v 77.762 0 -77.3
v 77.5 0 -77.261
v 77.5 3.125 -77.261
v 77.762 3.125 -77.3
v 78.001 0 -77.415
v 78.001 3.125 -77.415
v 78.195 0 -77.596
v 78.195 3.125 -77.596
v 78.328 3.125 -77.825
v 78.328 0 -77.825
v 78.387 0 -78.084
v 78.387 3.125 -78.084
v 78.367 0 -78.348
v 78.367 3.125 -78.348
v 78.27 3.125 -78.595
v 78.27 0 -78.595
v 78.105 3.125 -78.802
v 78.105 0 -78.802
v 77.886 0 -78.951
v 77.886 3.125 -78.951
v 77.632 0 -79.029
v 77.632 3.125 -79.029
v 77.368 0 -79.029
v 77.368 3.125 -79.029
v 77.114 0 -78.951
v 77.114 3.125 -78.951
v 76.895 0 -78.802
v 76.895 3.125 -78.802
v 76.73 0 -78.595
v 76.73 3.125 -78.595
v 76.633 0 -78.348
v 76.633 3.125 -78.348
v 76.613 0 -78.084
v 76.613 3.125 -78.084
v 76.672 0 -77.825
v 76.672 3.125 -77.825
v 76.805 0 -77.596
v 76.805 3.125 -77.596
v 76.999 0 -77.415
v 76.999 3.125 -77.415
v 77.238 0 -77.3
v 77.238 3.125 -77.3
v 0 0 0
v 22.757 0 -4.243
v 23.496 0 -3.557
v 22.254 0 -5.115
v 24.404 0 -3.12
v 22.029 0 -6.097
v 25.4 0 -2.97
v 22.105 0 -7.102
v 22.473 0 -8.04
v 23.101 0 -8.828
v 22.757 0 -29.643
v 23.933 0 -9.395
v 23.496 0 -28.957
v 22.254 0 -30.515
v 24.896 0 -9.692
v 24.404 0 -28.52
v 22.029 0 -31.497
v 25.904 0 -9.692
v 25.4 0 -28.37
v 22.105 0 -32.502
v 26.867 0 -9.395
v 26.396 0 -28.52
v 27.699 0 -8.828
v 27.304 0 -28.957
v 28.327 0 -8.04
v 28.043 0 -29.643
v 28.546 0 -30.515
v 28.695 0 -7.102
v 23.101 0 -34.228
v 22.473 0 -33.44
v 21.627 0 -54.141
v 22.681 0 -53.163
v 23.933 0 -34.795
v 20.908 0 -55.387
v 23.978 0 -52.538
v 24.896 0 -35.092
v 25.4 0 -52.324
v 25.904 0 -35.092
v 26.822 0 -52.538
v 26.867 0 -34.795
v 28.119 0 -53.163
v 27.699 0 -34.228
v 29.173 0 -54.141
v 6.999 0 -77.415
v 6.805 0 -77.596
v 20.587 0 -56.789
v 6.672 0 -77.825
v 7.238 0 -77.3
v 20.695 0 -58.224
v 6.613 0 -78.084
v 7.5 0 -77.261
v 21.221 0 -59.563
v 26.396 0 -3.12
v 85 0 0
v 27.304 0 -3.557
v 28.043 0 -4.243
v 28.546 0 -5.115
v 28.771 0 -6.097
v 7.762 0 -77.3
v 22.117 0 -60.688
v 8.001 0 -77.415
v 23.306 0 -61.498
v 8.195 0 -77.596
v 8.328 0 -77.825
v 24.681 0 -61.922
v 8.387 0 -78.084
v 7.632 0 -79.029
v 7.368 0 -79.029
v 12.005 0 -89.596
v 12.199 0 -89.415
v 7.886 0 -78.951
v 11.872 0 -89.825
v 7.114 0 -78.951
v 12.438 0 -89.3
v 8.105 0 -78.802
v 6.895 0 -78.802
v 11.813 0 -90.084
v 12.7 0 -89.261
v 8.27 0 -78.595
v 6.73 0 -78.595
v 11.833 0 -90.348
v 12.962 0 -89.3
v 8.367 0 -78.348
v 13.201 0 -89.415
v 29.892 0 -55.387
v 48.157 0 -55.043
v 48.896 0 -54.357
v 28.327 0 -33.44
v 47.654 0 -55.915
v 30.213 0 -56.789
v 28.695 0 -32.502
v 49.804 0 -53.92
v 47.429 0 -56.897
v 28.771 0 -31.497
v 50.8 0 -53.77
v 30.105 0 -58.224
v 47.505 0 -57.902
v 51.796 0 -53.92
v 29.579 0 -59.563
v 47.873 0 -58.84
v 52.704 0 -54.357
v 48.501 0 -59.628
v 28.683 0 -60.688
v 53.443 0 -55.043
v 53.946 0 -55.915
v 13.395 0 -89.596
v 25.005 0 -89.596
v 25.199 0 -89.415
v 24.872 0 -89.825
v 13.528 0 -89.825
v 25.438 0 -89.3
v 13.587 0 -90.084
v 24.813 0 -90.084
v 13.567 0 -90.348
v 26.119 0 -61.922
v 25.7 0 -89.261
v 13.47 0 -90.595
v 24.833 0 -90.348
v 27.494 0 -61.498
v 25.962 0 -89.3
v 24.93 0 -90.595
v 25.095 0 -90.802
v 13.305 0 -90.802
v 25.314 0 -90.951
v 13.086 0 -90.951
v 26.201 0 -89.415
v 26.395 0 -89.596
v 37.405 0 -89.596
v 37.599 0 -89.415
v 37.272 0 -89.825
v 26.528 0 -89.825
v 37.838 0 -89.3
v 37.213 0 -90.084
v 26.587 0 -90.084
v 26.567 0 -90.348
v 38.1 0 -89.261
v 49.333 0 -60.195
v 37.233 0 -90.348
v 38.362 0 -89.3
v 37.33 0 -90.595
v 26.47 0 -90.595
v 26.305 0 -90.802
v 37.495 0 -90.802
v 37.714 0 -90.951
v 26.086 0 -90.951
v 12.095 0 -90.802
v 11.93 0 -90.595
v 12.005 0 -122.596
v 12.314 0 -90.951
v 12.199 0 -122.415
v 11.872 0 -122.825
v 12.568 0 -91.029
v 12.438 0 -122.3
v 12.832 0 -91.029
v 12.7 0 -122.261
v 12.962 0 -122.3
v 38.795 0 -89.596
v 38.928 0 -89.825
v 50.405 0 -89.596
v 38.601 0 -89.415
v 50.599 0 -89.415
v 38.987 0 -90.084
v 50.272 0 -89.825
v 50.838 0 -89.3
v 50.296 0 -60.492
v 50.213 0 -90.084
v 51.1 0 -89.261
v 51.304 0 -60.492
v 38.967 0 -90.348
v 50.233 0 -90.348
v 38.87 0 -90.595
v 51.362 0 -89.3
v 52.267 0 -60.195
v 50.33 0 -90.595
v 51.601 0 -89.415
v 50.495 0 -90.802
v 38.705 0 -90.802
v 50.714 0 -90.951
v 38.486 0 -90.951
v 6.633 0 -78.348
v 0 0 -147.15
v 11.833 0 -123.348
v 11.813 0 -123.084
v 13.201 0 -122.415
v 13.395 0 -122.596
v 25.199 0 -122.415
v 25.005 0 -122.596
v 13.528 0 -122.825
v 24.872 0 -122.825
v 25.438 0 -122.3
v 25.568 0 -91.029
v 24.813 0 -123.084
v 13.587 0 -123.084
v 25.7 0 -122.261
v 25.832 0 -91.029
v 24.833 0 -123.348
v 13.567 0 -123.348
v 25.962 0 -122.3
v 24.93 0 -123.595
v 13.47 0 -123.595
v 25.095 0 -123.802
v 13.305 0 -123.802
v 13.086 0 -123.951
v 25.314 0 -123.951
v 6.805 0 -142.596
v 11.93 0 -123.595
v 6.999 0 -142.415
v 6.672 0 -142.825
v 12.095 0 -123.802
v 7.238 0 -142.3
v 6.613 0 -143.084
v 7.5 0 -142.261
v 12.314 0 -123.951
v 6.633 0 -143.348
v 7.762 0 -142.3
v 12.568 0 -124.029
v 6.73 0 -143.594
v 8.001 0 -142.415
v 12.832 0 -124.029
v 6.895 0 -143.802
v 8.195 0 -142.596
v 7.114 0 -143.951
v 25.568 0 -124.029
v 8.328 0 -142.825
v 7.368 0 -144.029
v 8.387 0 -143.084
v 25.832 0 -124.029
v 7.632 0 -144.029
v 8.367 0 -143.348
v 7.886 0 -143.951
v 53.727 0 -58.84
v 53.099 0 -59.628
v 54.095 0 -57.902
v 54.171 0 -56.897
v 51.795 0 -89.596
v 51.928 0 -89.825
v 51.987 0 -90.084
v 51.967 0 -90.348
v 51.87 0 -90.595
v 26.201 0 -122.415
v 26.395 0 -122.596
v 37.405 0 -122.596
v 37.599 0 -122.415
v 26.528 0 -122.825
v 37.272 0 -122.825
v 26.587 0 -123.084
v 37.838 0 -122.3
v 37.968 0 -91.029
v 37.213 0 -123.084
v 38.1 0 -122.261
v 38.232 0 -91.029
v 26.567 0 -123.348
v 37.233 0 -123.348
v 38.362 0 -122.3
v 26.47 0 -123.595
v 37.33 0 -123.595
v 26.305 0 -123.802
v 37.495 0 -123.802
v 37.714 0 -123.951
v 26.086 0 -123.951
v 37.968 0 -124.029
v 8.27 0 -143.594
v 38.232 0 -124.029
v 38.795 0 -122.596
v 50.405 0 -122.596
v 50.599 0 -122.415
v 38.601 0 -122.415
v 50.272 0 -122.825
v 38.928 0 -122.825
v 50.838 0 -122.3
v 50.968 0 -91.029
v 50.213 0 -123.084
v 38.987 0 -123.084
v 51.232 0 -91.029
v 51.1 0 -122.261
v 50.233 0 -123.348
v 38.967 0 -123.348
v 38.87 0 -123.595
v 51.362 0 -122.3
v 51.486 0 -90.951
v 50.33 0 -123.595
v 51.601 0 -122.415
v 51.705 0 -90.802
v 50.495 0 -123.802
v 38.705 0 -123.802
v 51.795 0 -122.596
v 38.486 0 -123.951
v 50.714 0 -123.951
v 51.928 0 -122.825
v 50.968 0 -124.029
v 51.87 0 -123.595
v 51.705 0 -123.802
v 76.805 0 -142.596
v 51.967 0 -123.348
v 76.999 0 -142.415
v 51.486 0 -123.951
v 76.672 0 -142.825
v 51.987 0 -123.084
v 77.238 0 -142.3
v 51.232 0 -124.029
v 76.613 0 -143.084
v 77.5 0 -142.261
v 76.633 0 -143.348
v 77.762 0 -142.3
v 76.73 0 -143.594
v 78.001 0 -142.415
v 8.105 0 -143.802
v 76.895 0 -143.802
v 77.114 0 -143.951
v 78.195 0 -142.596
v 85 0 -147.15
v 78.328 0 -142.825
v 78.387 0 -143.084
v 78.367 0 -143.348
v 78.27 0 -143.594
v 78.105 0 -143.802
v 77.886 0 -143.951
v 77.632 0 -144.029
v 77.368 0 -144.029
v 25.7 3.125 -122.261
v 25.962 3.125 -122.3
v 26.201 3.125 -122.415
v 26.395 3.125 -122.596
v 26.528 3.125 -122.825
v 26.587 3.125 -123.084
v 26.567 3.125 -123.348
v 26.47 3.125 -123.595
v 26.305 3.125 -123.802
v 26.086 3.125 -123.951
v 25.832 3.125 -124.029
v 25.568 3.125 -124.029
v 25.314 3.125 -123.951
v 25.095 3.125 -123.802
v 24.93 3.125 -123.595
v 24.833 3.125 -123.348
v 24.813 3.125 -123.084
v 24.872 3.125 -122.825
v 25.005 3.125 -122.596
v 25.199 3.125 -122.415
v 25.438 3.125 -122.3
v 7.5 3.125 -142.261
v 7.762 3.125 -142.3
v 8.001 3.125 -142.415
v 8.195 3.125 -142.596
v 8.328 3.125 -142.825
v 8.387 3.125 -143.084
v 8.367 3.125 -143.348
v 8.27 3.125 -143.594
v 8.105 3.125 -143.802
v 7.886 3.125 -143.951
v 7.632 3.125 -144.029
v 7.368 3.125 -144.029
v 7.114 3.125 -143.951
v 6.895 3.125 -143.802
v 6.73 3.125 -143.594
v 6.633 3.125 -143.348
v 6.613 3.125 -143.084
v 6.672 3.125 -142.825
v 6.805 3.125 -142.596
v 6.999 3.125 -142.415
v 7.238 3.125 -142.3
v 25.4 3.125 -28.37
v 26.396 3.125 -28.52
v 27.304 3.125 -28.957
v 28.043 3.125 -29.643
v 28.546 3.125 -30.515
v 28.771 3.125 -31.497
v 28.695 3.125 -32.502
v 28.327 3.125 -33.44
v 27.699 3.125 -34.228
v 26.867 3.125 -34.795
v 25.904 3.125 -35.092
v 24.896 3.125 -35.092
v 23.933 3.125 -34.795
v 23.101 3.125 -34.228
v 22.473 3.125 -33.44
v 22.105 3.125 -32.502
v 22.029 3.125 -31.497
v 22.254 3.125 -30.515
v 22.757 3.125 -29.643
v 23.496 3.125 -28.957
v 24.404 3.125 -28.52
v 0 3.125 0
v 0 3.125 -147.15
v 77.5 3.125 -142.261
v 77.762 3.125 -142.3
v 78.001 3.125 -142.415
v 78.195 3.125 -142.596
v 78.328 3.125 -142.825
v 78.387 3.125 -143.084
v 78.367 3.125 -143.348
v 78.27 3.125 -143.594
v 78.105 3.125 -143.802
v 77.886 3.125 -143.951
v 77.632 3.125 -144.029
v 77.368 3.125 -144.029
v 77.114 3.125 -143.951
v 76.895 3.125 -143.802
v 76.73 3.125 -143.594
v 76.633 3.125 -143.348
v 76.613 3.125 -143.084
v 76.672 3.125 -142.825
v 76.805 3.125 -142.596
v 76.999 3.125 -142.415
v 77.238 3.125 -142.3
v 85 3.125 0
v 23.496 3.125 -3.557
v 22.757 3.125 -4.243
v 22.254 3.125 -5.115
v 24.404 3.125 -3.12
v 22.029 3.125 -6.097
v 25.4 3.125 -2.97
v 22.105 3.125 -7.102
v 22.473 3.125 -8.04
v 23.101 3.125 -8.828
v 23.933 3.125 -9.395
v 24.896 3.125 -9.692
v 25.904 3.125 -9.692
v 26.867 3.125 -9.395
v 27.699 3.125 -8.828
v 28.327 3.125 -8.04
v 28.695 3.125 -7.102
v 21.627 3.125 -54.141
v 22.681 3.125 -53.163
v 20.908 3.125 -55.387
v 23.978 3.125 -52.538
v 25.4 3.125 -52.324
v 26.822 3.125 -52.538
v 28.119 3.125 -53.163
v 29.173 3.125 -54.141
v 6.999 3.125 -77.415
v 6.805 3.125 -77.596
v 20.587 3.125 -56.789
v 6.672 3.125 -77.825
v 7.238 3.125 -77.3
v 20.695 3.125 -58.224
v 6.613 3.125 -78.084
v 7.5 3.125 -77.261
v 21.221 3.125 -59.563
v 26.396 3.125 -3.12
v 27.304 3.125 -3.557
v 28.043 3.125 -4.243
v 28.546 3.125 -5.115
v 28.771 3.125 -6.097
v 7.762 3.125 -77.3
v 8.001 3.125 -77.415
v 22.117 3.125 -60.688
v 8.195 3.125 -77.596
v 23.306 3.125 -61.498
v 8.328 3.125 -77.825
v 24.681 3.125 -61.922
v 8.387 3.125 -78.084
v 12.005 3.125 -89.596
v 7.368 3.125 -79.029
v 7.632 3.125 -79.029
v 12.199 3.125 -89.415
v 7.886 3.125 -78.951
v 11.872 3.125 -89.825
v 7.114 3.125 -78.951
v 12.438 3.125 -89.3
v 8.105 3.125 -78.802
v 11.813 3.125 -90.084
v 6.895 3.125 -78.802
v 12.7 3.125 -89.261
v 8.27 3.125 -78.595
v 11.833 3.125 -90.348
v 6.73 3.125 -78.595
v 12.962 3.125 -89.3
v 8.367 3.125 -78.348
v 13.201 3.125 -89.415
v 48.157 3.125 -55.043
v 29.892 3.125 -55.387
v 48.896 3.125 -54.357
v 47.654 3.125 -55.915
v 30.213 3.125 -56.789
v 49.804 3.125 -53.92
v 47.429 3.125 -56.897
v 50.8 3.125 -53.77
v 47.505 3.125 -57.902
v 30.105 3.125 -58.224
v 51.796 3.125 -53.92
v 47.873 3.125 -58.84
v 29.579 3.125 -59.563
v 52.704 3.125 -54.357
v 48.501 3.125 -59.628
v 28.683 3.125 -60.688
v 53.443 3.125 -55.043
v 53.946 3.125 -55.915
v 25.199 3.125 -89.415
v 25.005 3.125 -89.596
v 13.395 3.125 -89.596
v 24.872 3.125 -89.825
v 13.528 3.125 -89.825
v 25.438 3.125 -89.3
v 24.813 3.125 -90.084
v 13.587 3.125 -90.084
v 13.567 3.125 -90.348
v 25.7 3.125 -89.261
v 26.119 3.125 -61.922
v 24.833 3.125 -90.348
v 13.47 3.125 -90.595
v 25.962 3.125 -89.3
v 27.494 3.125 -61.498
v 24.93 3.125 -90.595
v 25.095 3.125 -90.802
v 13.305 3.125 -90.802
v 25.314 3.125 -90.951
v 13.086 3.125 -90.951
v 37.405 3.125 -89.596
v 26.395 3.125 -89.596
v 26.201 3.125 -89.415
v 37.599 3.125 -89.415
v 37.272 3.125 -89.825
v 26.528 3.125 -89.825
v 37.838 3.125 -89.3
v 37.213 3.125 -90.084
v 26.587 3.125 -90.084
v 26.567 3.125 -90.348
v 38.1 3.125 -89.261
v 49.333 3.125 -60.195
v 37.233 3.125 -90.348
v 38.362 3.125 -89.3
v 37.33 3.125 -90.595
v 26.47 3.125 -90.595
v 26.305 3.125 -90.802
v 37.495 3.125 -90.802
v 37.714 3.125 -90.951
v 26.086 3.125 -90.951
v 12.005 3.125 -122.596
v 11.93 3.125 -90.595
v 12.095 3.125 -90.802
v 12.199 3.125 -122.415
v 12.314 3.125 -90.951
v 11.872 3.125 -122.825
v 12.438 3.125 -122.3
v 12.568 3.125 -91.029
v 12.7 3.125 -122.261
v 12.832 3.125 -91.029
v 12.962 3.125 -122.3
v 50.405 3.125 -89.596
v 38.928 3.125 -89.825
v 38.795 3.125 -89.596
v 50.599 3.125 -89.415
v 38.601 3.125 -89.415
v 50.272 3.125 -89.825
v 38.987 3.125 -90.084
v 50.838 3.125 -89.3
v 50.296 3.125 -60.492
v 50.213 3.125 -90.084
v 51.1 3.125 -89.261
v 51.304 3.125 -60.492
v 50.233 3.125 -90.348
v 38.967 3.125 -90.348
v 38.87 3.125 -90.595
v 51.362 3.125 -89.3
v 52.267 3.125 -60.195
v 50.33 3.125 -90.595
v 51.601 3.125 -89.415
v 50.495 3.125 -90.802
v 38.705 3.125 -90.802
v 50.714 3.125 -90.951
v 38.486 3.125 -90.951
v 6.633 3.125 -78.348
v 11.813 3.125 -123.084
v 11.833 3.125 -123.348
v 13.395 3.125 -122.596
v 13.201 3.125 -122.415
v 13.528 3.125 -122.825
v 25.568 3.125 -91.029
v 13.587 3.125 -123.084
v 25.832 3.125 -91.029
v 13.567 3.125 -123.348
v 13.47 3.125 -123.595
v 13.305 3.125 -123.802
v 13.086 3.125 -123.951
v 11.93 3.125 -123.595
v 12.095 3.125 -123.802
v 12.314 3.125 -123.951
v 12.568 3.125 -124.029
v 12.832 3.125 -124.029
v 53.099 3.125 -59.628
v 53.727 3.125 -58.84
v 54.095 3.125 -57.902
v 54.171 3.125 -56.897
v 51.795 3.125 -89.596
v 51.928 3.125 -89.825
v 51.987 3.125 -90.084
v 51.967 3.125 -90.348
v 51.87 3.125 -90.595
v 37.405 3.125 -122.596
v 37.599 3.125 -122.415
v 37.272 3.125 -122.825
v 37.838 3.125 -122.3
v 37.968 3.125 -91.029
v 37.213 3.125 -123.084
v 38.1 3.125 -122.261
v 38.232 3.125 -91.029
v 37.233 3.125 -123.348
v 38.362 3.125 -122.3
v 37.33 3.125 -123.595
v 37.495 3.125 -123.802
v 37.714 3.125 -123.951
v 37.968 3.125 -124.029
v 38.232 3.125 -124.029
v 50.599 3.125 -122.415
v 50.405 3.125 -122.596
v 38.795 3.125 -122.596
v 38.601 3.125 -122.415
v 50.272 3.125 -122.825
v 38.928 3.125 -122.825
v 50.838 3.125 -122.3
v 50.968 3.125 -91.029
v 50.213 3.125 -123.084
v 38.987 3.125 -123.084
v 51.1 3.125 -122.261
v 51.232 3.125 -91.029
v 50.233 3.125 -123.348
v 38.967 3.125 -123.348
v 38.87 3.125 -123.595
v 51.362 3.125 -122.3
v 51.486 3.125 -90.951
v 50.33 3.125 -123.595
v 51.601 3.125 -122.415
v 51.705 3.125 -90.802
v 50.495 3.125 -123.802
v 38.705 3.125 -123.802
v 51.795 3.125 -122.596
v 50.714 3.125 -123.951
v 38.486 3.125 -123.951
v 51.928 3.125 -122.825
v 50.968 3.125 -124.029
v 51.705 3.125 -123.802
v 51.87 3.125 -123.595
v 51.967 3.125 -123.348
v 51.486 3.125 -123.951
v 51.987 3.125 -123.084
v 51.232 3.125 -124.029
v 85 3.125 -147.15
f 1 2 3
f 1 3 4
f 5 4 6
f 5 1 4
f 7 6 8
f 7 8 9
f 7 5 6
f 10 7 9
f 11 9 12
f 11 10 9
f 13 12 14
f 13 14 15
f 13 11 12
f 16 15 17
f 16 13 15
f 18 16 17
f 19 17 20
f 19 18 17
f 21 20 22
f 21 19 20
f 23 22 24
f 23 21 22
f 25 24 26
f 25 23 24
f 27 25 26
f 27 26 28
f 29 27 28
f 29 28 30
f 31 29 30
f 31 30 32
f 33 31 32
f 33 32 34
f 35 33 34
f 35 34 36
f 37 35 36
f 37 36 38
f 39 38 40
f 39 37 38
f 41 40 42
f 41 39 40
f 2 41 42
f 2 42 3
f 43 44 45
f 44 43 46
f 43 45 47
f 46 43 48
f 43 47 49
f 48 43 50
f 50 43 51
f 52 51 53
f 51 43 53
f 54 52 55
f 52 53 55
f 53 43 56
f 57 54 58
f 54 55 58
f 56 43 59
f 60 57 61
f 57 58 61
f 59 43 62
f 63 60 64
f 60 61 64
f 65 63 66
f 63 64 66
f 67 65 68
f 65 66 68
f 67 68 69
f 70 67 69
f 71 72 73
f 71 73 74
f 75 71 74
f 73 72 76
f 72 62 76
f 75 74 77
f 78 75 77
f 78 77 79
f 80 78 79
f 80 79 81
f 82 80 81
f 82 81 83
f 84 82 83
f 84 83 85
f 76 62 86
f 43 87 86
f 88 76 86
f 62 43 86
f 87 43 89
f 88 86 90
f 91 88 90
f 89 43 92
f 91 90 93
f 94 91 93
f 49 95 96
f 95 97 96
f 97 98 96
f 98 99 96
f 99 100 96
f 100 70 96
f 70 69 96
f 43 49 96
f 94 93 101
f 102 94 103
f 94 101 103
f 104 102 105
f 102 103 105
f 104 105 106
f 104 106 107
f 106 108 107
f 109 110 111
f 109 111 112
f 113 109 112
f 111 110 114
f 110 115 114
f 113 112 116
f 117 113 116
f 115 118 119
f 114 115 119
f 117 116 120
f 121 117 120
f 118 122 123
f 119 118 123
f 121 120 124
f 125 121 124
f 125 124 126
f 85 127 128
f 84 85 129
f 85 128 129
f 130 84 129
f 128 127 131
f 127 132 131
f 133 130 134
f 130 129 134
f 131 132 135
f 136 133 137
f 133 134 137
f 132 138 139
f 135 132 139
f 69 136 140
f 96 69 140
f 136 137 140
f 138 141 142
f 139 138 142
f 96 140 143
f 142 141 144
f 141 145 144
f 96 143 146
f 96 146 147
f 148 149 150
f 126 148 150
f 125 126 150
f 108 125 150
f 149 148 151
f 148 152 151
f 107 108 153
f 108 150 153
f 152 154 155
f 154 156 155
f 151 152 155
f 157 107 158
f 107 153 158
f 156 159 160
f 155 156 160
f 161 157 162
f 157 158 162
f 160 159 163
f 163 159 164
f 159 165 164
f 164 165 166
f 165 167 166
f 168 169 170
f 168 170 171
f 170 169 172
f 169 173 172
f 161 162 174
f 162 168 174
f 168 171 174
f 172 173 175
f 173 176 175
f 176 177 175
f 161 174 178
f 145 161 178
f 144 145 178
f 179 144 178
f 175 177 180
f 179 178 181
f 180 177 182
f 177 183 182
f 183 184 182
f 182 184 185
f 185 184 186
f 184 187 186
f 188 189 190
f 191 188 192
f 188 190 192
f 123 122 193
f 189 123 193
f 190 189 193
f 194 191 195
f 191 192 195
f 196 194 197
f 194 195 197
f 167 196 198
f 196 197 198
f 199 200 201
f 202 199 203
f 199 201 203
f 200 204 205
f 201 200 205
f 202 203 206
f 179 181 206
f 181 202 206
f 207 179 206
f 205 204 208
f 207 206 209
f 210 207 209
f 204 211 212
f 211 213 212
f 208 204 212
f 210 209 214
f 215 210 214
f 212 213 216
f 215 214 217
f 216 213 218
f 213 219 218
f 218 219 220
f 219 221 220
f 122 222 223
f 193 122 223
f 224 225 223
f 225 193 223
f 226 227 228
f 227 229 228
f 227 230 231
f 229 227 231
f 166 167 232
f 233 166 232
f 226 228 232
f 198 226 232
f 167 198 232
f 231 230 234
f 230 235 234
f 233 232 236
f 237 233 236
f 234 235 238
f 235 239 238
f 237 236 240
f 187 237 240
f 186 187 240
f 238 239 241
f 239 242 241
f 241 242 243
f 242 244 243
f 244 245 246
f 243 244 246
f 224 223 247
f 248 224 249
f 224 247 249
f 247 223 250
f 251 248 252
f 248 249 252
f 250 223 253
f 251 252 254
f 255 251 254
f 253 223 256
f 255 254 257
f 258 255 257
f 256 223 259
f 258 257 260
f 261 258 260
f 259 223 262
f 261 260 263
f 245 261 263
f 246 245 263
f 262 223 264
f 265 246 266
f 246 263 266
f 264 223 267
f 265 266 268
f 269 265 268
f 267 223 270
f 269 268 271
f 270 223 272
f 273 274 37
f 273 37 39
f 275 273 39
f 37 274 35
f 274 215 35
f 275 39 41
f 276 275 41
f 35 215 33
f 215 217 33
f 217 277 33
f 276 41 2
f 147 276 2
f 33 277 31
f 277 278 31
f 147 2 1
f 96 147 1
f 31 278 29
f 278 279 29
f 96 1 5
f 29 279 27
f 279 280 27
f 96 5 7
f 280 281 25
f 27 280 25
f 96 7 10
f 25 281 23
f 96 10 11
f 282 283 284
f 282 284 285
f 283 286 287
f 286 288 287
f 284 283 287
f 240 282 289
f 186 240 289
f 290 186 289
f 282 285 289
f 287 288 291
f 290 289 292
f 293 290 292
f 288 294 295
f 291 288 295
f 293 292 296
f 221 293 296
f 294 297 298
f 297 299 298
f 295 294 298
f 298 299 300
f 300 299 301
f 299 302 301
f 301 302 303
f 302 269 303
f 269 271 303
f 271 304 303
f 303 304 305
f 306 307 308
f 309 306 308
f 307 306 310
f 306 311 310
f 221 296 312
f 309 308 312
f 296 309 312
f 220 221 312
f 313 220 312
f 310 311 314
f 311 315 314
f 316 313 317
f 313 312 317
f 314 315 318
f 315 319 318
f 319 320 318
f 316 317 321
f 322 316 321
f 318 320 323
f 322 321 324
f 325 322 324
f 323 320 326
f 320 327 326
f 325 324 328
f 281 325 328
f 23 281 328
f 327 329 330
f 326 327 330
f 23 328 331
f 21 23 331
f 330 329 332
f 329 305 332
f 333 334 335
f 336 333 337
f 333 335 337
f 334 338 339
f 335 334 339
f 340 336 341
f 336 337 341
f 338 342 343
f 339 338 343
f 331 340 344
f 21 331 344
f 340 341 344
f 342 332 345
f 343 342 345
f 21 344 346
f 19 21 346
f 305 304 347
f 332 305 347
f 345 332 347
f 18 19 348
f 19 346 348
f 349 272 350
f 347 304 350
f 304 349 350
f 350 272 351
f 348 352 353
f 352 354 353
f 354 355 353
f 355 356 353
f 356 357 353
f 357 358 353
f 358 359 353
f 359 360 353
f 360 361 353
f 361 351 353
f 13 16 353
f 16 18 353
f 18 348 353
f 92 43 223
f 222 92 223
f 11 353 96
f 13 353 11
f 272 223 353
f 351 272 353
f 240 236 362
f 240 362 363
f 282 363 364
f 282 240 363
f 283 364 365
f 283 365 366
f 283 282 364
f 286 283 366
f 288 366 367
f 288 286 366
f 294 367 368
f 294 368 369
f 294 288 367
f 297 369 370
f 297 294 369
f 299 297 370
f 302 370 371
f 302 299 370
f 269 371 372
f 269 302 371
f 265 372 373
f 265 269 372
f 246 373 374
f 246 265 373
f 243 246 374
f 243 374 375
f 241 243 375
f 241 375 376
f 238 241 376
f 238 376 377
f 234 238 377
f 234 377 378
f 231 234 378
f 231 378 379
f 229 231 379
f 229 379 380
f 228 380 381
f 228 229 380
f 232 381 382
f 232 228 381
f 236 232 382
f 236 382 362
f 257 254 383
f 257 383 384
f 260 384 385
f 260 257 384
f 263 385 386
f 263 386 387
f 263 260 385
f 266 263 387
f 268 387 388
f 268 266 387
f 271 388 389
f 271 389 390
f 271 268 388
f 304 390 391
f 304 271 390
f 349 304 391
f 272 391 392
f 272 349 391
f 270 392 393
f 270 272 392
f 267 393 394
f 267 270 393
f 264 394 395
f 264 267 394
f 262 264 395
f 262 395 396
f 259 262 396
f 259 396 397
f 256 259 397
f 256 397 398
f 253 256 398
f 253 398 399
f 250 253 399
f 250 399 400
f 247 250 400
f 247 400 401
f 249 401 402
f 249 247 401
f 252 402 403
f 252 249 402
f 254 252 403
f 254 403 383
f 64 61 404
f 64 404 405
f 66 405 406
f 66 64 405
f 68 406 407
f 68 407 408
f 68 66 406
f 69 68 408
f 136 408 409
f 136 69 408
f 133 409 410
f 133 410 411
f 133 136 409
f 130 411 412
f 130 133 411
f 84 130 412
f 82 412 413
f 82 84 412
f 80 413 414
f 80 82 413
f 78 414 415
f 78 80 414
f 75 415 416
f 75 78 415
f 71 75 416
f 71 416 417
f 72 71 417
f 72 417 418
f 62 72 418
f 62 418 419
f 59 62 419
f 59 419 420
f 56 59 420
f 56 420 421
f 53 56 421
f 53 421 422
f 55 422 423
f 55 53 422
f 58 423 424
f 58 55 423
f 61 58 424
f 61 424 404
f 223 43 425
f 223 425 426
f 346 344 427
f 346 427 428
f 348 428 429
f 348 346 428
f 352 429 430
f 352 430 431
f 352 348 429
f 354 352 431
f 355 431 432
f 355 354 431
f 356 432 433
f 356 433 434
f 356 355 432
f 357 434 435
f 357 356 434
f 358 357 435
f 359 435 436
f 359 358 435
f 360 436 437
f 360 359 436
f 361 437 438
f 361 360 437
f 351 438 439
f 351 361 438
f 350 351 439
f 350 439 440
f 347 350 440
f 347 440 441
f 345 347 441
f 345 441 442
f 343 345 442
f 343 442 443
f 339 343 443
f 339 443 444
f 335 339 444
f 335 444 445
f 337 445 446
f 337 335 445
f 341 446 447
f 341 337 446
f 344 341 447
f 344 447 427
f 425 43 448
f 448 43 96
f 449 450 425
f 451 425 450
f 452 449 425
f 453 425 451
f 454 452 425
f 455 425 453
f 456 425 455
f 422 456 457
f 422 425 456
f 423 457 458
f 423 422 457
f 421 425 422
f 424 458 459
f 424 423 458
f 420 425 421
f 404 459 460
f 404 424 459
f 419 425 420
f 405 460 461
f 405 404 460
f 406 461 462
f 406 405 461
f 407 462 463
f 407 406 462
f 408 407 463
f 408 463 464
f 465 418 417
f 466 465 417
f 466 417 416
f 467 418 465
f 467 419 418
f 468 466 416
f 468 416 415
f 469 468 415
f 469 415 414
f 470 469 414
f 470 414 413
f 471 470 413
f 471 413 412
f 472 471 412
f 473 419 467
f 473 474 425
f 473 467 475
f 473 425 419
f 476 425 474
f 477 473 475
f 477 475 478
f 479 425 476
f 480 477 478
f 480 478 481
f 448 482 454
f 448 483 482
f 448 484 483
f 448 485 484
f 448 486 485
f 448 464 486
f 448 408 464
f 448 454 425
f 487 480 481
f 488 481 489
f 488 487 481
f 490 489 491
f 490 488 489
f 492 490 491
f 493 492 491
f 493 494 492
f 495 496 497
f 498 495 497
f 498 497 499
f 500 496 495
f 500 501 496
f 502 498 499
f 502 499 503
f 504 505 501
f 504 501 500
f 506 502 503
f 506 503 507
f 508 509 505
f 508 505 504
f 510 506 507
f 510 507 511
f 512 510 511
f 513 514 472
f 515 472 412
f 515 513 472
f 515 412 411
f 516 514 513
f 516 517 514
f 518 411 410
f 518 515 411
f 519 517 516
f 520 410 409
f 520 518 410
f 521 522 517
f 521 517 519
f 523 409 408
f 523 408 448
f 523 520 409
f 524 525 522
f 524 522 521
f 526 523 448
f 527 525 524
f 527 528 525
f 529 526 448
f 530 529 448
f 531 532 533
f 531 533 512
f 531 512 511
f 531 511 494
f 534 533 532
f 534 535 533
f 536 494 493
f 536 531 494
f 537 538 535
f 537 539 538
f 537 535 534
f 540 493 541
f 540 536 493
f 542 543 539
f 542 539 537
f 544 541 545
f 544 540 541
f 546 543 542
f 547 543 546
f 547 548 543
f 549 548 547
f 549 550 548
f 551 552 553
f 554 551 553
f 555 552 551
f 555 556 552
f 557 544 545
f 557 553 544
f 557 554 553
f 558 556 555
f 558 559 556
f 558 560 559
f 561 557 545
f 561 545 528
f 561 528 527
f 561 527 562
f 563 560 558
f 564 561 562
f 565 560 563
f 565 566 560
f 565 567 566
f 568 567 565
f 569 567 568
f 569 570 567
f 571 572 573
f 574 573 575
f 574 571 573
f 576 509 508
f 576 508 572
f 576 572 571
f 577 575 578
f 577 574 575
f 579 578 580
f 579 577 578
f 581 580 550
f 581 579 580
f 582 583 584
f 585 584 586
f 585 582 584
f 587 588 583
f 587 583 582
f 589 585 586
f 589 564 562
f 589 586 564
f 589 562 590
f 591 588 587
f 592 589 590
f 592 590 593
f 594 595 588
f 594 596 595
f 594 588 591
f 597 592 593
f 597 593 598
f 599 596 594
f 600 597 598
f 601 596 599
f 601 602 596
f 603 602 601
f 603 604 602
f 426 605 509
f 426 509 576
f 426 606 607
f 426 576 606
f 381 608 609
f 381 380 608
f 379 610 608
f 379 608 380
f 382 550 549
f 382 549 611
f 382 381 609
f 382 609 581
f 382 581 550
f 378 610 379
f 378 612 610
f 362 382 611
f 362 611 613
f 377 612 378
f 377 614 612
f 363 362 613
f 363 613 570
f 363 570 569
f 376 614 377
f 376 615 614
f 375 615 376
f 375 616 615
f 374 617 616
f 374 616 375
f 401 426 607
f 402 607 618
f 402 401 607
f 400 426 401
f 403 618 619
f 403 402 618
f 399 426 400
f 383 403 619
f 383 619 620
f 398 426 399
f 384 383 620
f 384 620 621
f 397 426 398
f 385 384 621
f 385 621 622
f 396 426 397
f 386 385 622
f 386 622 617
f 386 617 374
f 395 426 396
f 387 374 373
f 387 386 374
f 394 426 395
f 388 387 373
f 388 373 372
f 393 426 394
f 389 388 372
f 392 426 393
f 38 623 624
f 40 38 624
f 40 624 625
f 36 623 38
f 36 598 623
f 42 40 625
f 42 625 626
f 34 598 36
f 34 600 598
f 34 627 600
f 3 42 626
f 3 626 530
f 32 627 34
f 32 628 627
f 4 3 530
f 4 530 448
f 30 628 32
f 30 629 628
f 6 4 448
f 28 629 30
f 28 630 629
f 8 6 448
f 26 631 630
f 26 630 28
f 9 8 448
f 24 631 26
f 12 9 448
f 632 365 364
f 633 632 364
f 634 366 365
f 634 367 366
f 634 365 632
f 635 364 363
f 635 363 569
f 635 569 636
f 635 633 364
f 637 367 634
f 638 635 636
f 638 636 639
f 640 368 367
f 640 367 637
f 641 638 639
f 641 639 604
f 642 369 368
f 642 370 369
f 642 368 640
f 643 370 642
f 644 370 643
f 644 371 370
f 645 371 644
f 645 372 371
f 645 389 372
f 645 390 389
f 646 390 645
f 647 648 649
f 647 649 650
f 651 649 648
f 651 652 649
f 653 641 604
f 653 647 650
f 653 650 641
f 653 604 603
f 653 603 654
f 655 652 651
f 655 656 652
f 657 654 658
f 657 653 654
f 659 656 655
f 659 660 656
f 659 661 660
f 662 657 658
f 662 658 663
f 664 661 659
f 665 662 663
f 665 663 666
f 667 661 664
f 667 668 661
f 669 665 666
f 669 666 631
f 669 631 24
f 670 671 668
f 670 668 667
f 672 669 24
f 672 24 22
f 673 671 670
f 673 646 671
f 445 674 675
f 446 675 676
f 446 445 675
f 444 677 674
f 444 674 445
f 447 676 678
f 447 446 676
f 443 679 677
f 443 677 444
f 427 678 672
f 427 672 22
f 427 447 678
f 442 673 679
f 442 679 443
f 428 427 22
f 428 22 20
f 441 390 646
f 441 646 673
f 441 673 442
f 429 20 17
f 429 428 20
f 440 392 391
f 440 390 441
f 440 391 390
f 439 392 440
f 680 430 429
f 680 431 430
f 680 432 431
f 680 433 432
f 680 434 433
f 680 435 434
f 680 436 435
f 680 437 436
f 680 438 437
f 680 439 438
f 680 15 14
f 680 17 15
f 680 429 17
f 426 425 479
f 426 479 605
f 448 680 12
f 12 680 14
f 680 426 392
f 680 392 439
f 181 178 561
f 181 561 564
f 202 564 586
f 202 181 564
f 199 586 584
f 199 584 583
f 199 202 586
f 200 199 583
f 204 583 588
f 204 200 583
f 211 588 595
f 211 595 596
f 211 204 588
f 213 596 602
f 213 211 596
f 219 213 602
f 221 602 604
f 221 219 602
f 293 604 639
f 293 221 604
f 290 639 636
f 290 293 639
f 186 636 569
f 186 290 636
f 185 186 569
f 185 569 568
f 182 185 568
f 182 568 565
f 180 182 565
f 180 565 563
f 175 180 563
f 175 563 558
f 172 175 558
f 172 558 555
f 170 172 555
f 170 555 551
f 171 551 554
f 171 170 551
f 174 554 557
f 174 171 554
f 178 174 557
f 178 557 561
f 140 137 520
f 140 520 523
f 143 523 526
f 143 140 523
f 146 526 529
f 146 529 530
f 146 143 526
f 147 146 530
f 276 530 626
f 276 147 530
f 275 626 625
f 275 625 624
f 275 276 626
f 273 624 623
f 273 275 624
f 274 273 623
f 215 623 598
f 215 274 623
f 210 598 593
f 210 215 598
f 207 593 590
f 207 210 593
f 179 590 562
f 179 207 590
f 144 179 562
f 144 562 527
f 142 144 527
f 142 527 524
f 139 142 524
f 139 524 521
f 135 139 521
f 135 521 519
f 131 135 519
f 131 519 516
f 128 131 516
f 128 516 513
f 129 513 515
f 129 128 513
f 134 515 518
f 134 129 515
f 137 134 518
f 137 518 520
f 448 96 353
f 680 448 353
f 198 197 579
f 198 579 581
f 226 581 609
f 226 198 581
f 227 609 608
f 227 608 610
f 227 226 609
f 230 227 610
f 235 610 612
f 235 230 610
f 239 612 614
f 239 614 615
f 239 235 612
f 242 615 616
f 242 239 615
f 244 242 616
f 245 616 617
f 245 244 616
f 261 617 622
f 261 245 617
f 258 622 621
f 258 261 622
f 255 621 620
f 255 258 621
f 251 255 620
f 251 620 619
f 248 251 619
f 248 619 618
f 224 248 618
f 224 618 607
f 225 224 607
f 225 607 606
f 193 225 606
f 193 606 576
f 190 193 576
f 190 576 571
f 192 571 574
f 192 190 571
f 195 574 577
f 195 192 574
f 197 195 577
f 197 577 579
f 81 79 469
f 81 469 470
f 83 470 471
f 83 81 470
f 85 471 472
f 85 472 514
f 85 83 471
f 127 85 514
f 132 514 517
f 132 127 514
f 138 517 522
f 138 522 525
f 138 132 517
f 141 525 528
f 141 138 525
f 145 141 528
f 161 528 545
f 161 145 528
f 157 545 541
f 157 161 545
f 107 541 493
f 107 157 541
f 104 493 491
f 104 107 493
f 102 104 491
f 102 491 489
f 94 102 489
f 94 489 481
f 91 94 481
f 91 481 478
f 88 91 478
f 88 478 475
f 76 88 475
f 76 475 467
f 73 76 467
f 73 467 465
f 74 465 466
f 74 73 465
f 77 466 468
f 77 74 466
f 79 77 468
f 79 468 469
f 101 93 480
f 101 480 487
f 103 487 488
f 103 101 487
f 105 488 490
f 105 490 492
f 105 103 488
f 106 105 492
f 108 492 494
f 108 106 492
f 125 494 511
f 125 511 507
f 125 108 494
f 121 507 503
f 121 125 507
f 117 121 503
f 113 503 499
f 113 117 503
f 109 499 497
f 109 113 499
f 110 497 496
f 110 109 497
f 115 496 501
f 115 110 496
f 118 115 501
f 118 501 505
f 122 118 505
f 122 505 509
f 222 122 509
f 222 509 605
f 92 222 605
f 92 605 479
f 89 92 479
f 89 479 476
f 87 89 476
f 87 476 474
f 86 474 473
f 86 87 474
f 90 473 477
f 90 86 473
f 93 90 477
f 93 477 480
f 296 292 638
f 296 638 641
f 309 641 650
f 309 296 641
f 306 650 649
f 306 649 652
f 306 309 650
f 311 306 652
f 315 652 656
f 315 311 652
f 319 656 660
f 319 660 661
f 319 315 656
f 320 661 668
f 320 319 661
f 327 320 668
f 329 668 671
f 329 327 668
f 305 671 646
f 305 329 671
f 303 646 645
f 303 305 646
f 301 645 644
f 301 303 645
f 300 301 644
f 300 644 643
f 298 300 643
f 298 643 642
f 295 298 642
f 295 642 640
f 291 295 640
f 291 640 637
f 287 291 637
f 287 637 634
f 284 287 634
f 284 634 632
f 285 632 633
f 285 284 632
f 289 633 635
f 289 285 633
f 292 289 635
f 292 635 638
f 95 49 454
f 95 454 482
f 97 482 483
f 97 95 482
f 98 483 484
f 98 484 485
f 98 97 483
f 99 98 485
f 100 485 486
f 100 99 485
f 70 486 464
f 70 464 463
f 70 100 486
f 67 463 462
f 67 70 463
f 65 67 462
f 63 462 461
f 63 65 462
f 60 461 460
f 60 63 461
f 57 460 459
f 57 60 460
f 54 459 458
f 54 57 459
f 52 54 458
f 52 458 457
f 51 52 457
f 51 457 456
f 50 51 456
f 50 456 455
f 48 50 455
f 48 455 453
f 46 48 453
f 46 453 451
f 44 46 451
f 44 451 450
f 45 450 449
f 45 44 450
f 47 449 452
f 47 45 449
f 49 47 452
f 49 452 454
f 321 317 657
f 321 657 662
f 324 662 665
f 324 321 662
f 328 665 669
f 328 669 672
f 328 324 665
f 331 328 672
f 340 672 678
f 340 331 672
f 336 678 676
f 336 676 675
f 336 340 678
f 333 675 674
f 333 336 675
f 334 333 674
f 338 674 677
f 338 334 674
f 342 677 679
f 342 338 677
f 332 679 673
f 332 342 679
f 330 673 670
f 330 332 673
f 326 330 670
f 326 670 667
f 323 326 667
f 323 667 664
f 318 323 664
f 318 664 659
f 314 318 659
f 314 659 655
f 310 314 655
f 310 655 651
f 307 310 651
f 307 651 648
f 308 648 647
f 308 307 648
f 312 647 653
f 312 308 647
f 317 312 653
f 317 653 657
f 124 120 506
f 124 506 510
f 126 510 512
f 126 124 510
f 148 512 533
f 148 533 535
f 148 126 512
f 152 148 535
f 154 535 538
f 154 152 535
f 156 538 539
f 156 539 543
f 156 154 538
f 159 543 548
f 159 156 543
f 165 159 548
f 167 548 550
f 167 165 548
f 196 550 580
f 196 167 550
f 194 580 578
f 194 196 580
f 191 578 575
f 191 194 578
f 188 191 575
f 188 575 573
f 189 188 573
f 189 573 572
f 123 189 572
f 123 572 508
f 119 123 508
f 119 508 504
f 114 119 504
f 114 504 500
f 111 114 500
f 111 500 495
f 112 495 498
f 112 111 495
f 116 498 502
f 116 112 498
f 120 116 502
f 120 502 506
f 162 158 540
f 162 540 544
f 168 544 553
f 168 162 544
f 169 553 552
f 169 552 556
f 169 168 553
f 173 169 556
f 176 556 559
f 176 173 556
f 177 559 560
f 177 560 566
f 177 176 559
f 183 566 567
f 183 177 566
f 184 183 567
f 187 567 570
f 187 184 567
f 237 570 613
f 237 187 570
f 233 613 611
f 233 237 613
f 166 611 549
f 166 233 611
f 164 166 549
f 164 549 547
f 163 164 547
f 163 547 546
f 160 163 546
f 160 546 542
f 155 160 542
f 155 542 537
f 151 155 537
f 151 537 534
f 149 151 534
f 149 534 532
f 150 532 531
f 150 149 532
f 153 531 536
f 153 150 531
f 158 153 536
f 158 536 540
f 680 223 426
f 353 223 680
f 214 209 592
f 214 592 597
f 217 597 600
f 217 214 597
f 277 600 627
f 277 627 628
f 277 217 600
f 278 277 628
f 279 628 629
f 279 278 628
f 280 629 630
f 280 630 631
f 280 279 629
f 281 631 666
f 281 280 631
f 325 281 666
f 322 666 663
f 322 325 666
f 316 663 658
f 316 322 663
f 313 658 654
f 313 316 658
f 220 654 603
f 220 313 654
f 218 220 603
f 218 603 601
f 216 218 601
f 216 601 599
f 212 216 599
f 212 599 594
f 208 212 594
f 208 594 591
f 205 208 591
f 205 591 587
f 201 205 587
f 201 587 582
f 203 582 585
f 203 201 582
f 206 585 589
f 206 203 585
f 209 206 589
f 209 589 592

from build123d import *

# Parameters (mm, degrees)
SKETCH1_W           = 85
SKETCH1_H           = 147.15
SKETCH1_R           = 4.826
SKETCH1_R_2         = 3.38
SKETCH1_R_3         = 0.889
BOSS_EXTRUDE1_DEPTH = 3.125


with BuildPart() as part:
    # Sketch1 → Boss-Extrude1 (new body)
    with BuildSketch(Plane(origin=(0, 0, 0), x_dir=(1, 0, 0), z_dir=(0, 1, 0))):
        with Locations((42.5, 73.575)):
            Rectangle(SKETCH1_W, SKETCH1_H)
        with Locations(Location((25.4, 57.15, 0), (0, 0, 270))):
            Circle(SKETCH1_R, mode=Mode.SUBTRACT)
        with Locations(Location((25.4, 31.75, 0), (0, 0, 270))):
            Circle(SKETCH1_R_2, mode=Mode.SUBTRACT)
        with Locations(Location((25.4, 6.35, 0), (0, 0, 270))):
            Circle(SKETCH1_R_2, mode=Mode.SUBTRACT)
        with Locations(Location((50.8, 57.15, 0), (0, 0, 270))):
            Circle(SKETCH1_R_2, mode=Mode.SUBTRACT)
        with Locations(Location((7.5, 143.15, 0), (0, 0, 270))):
            Circle(SKETCH1_R_3, mode=Mode.SUBTRACT)
        with Locations(Location((77.5, 143.15, 0), (0, 0, 270))):
            Circle(SKETCH1_R_3, mode=Mode.SUBTRACT)
        with Locations(Location((77.5, 78.15, 0), (0, 0, 270))):
            Circle(SKETCH1_R_3, mode=Mode.SUBTRACT)
        with Locations(Location((7.5, 78.15, 0), (0, 0, 270))):
            Circle(SKETCH1_R_3, mode=Mode.SUBTRACT)
        with Locations(Location((12.7, 123.15, 0), (0, 0, 270))):
            Circle(SKETCH1_R_3, mode=Mode.SUBTRACT)
        with Locations(Location((25.7, 90.15, 0), (0, 0, 270))):
            Circle(SKETCH1_R_3, mode=Mode.SUBTRACT)
        with Locations(Location((25.7, 123.15, 0), (0, 0, 270))):
            Circle(SKETCH1_R_3, mode=Mode.SUBTRACT)
        with Locations(Location((12.7, 90.15, 0), (0, 0, 270))):
            Circle(SKETCH1_R_3, mode=Mode.SUBTRACT)
        with Locations(Location((38.1, 123.15, 0), (0, 0, 270))):
            Circle(SKETCH1_R_3, mode=Mode.SUBTRACT)
        with Locations(Location((51.1, 123.15, 0), (0, 0, 270))):
            Circle(SKETCH1_R_3, mode=Mode.SUBTRACT)
        with Locations(Location((51.1, 90.15, 0), (0, 0, 270))):
            Circle(SKETCH1_R_3, mode=Mode.SUBTRACT)
        with Locations(Location((38.1, 90.15, 0), (0, 0, 270))):
            Circle(SKETCH1_R_3, mode=Mode.SUBTRACT)
    extrude(amount=BOSS_EXTRUDE1_DEPTH)


solid = part.part
